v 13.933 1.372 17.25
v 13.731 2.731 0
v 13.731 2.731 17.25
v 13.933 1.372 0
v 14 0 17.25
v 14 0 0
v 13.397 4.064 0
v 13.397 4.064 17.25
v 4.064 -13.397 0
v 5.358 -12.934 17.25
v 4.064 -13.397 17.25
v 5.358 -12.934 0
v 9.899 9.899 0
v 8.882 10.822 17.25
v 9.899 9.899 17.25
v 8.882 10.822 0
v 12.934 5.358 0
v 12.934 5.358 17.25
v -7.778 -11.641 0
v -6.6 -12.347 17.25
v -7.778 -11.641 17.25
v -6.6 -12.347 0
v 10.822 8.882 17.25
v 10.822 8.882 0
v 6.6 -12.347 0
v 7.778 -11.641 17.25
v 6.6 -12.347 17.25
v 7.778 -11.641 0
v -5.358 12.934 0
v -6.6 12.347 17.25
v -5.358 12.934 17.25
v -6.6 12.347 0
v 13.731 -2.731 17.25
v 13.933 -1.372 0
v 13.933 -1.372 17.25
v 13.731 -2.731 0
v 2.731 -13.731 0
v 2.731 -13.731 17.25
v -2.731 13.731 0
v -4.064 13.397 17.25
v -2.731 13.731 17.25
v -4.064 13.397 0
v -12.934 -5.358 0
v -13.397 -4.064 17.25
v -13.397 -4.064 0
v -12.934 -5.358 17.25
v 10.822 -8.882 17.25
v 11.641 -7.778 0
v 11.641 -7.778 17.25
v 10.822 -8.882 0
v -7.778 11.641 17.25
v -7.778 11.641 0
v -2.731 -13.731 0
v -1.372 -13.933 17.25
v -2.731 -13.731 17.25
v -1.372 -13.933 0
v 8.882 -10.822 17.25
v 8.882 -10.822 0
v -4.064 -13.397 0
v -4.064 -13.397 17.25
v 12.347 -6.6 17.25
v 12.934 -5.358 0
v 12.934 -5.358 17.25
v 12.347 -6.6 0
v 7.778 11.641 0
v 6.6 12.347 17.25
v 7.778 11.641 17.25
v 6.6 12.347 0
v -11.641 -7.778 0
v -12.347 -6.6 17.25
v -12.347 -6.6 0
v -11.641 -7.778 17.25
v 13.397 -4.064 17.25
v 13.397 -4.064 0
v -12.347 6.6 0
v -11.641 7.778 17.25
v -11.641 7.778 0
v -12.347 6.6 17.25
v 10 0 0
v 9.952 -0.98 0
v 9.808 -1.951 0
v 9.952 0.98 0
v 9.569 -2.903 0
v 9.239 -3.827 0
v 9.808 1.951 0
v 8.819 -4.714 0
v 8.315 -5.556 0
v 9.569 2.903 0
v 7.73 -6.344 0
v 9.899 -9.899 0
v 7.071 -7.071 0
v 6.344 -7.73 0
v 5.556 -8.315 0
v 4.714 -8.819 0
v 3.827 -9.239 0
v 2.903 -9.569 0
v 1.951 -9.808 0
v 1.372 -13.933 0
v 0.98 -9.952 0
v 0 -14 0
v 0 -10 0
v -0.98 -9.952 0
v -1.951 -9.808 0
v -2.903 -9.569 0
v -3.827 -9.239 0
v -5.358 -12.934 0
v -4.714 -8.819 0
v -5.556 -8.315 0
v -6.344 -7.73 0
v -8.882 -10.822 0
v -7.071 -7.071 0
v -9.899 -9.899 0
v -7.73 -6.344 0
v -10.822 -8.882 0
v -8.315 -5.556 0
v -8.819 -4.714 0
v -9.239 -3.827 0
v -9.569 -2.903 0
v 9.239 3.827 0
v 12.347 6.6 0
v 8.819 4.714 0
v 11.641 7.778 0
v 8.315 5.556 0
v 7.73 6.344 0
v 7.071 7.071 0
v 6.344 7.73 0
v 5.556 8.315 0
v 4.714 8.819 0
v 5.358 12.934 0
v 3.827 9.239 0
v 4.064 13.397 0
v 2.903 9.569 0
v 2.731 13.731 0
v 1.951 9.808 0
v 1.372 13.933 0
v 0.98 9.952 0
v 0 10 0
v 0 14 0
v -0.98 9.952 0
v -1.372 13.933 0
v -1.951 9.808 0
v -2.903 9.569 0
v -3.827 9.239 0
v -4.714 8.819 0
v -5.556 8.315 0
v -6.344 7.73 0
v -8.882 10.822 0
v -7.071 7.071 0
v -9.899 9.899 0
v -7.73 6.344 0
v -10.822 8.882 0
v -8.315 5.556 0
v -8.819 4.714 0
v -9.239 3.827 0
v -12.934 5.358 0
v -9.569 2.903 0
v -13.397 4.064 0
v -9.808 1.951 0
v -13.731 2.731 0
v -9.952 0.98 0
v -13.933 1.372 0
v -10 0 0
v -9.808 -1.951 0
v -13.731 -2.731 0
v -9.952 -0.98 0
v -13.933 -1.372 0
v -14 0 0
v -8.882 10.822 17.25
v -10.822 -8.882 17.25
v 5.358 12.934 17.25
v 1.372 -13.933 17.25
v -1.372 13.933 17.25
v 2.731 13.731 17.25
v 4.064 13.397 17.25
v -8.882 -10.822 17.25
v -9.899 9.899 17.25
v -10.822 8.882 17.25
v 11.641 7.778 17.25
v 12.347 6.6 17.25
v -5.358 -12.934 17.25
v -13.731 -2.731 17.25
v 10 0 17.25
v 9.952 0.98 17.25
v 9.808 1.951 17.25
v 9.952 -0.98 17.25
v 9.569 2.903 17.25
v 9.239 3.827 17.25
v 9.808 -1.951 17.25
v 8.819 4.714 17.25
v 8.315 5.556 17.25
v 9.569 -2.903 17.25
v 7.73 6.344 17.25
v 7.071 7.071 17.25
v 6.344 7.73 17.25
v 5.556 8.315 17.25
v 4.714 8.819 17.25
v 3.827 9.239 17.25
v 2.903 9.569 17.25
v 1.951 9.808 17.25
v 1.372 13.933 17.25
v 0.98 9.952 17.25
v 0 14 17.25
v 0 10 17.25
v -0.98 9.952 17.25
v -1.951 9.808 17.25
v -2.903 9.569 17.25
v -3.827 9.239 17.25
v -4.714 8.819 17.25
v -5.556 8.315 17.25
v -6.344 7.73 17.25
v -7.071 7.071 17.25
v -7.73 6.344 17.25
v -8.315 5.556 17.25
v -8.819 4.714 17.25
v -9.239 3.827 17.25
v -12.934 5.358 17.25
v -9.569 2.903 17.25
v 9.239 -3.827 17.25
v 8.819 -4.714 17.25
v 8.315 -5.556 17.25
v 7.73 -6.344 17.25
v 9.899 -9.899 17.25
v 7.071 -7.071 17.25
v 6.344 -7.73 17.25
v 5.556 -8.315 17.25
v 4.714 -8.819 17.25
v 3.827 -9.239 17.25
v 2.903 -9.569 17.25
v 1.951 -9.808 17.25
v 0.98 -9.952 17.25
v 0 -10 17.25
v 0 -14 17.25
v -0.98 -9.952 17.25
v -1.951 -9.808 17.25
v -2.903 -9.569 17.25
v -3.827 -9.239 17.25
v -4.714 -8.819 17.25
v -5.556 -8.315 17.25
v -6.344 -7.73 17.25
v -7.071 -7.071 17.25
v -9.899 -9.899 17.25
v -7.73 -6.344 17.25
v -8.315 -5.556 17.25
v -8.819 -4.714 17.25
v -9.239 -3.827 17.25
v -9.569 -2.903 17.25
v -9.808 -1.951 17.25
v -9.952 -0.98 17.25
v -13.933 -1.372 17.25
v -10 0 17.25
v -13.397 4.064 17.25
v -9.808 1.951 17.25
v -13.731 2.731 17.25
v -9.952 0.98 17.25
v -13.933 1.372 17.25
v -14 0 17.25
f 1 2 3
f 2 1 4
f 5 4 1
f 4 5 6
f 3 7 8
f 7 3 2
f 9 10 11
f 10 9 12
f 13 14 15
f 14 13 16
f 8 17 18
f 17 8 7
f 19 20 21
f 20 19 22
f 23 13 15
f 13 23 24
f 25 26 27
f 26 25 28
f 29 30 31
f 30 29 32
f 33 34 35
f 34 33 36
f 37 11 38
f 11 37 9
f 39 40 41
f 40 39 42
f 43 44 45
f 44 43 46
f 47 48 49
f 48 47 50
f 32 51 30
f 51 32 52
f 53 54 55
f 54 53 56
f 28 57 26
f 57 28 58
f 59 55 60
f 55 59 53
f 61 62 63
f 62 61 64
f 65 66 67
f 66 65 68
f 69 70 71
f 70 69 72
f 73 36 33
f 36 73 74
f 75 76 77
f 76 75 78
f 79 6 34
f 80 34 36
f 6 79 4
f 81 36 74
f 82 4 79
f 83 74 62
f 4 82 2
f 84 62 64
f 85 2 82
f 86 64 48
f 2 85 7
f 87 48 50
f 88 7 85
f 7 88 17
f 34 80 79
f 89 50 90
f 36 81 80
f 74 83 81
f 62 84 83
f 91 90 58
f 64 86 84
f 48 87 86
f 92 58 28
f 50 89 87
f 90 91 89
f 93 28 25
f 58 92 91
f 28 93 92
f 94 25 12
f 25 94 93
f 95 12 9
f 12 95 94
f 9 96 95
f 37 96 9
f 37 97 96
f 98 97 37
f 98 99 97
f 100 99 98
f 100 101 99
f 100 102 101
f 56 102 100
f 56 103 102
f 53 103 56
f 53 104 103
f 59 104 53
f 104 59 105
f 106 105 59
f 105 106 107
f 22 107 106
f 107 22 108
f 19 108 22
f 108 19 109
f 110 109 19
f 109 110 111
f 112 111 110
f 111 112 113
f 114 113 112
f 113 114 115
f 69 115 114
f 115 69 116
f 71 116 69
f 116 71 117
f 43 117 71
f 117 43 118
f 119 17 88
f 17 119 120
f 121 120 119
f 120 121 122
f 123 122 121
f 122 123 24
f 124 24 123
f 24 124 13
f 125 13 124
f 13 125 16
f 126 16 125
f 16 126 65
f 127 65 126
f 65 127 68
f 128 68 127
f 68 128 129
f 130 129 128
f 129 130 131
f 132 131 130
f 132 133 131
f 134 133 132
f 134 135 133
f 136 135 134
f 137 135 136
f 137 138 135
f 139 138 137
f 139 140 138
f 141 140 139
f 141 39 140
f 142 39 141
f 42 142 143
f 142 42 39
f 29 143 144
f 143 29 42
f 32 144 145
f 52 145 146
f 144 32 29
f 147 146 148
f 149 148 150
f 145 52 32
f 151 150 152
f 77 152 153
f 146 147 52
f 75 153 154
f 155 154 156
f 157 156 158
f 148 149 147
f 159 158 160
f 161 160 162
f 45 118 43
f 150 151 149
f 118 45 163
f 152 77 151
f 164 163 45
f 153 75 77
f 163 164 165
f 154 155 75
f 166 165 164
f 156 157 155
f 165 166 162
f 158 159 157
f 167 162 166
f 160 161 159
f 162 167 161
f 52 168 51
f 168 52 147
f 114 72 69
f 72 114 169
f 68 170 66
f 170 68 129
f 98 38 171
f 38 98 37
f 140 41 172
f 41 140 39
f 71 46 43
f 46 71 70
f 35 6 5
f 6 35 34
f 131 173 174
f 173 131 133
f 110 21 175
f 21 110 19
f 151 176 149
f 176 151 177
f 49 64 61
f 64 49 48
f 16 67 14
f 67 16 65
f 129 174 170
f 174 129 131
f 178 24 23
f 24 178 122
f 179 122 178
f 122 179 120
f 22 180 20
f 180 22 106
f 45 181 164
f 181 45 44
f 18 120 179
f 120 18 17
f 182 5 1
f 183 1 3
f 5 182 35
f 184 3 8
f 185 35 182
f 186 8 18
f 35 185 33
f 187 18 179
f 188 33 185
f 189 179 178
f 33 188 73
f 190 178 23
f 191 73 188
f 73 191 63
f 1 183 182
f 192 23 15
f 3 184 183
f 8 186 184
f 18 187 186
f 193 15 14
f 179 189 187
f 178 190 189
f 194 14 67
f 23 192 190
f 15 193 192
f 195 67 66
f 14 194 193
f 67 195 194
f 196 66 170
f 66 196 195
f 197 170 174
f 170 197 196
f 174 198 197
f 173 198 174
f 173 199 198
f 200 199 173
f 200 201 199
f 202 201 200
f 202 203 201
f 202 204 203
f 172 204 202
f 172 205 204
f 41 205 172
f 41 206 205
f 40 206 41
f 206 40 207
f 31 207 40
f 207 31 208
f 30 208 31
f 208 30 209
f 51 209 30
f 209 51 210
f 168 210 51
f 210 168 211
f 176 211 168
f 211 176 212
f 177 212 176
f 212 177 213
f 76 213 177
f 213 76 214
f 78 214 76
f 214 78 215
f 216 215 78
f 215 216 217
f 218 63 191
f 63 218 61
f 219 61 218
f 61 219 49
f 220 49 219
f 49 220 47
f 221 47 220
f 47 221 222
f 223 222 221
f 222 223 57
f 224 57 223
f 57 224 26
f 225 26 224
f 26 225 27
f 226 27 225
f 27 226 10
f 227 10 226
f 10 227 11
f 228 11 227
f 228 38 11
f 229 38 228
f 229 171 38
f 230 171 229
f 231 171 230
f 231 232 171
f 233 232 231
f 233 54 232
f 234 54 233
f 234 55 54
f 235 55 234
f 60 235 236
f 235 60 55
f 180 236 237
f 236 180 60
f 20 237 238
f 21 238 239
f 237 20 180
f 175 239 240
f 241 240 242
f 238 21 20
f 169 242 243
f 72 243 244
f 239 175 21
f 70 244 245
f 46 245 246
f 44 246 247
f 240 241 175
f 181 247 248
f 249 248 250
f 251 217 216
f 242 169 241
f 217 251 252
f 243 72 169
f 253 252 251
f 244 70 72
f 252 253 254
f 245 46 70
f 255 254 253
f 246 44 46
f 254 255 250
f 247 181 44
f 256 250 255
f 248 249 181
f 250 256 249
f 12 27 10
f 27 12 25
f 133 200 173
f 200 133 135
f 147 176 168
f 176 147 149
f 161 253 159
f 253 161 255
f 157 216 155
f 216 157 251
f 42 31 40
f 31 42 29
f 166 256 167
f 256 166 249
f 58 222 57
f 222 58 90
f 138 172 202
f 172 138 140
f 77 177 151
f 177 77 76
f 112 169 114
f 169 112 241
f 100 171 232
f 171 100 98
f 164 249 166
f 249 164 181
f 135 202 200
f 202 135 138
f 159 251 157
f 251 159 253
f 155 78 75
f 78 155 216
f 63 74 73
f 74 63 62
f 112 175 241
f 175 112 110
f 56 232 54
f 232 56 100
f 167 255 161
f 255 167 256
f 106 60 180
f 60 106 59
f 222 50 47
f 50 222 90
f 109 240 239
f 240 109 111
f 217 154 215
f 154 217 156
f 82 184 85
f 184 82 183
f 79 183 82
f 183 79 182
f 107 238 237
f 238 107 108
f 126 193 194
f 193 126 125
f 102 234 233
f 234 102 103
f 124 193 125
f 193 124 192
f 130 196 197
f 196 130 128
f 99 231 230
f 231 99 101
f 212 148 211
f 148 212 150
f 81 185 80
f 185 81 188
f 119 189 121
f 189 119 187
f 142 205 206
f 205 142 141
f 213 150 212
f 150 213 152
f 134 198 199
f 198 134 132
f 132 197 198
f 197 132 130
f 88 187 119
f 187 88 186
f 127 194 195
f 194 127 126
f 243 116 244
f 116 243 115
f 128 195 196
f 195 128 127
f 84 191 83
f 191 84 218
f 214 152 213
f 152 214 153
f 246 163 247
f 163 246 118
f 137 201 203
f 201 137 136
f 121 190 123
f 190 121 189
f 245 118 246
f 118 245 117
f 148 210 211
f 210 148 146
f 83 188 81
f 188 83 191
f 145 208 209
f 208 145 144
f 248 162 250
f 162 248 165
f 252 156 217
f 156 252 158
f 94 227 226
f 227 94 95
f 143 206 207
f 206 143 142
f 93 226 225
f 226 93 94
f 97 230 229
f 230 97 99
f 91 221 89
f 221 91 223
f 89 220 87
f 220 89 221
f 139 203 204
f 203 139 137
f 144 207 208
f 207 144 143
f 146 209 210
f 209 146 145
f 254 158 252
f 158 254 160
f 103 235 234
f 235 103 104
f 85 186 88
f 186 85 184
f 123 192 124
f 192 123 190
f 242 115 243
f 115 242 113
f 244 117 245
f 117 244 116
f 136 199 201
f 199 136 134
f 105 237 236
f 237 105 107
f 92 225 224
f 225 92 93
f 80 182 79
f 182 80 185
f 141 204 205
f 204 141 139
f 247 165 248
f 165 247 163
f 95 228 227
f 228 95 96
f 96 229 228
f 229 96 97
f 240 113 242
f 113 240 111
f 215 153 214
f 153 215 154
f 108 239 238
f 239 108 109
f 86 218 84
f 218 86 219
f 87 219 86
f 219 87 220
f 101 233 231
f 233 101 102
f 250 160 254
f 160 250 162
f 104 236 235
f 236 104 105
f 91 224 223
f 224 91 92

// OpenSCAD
module brushless_dc_motor() {
    difference() {
        // Outer casing
        cylinder(h = 17.25, d = 28.0, $fn = 64);
        
        // Inner hollow part
        translate([0, 0, -1])
            cylinder(h = 19.25, d = 20.0, $fn = 64);
    }
}

brushless_dc_motor();
